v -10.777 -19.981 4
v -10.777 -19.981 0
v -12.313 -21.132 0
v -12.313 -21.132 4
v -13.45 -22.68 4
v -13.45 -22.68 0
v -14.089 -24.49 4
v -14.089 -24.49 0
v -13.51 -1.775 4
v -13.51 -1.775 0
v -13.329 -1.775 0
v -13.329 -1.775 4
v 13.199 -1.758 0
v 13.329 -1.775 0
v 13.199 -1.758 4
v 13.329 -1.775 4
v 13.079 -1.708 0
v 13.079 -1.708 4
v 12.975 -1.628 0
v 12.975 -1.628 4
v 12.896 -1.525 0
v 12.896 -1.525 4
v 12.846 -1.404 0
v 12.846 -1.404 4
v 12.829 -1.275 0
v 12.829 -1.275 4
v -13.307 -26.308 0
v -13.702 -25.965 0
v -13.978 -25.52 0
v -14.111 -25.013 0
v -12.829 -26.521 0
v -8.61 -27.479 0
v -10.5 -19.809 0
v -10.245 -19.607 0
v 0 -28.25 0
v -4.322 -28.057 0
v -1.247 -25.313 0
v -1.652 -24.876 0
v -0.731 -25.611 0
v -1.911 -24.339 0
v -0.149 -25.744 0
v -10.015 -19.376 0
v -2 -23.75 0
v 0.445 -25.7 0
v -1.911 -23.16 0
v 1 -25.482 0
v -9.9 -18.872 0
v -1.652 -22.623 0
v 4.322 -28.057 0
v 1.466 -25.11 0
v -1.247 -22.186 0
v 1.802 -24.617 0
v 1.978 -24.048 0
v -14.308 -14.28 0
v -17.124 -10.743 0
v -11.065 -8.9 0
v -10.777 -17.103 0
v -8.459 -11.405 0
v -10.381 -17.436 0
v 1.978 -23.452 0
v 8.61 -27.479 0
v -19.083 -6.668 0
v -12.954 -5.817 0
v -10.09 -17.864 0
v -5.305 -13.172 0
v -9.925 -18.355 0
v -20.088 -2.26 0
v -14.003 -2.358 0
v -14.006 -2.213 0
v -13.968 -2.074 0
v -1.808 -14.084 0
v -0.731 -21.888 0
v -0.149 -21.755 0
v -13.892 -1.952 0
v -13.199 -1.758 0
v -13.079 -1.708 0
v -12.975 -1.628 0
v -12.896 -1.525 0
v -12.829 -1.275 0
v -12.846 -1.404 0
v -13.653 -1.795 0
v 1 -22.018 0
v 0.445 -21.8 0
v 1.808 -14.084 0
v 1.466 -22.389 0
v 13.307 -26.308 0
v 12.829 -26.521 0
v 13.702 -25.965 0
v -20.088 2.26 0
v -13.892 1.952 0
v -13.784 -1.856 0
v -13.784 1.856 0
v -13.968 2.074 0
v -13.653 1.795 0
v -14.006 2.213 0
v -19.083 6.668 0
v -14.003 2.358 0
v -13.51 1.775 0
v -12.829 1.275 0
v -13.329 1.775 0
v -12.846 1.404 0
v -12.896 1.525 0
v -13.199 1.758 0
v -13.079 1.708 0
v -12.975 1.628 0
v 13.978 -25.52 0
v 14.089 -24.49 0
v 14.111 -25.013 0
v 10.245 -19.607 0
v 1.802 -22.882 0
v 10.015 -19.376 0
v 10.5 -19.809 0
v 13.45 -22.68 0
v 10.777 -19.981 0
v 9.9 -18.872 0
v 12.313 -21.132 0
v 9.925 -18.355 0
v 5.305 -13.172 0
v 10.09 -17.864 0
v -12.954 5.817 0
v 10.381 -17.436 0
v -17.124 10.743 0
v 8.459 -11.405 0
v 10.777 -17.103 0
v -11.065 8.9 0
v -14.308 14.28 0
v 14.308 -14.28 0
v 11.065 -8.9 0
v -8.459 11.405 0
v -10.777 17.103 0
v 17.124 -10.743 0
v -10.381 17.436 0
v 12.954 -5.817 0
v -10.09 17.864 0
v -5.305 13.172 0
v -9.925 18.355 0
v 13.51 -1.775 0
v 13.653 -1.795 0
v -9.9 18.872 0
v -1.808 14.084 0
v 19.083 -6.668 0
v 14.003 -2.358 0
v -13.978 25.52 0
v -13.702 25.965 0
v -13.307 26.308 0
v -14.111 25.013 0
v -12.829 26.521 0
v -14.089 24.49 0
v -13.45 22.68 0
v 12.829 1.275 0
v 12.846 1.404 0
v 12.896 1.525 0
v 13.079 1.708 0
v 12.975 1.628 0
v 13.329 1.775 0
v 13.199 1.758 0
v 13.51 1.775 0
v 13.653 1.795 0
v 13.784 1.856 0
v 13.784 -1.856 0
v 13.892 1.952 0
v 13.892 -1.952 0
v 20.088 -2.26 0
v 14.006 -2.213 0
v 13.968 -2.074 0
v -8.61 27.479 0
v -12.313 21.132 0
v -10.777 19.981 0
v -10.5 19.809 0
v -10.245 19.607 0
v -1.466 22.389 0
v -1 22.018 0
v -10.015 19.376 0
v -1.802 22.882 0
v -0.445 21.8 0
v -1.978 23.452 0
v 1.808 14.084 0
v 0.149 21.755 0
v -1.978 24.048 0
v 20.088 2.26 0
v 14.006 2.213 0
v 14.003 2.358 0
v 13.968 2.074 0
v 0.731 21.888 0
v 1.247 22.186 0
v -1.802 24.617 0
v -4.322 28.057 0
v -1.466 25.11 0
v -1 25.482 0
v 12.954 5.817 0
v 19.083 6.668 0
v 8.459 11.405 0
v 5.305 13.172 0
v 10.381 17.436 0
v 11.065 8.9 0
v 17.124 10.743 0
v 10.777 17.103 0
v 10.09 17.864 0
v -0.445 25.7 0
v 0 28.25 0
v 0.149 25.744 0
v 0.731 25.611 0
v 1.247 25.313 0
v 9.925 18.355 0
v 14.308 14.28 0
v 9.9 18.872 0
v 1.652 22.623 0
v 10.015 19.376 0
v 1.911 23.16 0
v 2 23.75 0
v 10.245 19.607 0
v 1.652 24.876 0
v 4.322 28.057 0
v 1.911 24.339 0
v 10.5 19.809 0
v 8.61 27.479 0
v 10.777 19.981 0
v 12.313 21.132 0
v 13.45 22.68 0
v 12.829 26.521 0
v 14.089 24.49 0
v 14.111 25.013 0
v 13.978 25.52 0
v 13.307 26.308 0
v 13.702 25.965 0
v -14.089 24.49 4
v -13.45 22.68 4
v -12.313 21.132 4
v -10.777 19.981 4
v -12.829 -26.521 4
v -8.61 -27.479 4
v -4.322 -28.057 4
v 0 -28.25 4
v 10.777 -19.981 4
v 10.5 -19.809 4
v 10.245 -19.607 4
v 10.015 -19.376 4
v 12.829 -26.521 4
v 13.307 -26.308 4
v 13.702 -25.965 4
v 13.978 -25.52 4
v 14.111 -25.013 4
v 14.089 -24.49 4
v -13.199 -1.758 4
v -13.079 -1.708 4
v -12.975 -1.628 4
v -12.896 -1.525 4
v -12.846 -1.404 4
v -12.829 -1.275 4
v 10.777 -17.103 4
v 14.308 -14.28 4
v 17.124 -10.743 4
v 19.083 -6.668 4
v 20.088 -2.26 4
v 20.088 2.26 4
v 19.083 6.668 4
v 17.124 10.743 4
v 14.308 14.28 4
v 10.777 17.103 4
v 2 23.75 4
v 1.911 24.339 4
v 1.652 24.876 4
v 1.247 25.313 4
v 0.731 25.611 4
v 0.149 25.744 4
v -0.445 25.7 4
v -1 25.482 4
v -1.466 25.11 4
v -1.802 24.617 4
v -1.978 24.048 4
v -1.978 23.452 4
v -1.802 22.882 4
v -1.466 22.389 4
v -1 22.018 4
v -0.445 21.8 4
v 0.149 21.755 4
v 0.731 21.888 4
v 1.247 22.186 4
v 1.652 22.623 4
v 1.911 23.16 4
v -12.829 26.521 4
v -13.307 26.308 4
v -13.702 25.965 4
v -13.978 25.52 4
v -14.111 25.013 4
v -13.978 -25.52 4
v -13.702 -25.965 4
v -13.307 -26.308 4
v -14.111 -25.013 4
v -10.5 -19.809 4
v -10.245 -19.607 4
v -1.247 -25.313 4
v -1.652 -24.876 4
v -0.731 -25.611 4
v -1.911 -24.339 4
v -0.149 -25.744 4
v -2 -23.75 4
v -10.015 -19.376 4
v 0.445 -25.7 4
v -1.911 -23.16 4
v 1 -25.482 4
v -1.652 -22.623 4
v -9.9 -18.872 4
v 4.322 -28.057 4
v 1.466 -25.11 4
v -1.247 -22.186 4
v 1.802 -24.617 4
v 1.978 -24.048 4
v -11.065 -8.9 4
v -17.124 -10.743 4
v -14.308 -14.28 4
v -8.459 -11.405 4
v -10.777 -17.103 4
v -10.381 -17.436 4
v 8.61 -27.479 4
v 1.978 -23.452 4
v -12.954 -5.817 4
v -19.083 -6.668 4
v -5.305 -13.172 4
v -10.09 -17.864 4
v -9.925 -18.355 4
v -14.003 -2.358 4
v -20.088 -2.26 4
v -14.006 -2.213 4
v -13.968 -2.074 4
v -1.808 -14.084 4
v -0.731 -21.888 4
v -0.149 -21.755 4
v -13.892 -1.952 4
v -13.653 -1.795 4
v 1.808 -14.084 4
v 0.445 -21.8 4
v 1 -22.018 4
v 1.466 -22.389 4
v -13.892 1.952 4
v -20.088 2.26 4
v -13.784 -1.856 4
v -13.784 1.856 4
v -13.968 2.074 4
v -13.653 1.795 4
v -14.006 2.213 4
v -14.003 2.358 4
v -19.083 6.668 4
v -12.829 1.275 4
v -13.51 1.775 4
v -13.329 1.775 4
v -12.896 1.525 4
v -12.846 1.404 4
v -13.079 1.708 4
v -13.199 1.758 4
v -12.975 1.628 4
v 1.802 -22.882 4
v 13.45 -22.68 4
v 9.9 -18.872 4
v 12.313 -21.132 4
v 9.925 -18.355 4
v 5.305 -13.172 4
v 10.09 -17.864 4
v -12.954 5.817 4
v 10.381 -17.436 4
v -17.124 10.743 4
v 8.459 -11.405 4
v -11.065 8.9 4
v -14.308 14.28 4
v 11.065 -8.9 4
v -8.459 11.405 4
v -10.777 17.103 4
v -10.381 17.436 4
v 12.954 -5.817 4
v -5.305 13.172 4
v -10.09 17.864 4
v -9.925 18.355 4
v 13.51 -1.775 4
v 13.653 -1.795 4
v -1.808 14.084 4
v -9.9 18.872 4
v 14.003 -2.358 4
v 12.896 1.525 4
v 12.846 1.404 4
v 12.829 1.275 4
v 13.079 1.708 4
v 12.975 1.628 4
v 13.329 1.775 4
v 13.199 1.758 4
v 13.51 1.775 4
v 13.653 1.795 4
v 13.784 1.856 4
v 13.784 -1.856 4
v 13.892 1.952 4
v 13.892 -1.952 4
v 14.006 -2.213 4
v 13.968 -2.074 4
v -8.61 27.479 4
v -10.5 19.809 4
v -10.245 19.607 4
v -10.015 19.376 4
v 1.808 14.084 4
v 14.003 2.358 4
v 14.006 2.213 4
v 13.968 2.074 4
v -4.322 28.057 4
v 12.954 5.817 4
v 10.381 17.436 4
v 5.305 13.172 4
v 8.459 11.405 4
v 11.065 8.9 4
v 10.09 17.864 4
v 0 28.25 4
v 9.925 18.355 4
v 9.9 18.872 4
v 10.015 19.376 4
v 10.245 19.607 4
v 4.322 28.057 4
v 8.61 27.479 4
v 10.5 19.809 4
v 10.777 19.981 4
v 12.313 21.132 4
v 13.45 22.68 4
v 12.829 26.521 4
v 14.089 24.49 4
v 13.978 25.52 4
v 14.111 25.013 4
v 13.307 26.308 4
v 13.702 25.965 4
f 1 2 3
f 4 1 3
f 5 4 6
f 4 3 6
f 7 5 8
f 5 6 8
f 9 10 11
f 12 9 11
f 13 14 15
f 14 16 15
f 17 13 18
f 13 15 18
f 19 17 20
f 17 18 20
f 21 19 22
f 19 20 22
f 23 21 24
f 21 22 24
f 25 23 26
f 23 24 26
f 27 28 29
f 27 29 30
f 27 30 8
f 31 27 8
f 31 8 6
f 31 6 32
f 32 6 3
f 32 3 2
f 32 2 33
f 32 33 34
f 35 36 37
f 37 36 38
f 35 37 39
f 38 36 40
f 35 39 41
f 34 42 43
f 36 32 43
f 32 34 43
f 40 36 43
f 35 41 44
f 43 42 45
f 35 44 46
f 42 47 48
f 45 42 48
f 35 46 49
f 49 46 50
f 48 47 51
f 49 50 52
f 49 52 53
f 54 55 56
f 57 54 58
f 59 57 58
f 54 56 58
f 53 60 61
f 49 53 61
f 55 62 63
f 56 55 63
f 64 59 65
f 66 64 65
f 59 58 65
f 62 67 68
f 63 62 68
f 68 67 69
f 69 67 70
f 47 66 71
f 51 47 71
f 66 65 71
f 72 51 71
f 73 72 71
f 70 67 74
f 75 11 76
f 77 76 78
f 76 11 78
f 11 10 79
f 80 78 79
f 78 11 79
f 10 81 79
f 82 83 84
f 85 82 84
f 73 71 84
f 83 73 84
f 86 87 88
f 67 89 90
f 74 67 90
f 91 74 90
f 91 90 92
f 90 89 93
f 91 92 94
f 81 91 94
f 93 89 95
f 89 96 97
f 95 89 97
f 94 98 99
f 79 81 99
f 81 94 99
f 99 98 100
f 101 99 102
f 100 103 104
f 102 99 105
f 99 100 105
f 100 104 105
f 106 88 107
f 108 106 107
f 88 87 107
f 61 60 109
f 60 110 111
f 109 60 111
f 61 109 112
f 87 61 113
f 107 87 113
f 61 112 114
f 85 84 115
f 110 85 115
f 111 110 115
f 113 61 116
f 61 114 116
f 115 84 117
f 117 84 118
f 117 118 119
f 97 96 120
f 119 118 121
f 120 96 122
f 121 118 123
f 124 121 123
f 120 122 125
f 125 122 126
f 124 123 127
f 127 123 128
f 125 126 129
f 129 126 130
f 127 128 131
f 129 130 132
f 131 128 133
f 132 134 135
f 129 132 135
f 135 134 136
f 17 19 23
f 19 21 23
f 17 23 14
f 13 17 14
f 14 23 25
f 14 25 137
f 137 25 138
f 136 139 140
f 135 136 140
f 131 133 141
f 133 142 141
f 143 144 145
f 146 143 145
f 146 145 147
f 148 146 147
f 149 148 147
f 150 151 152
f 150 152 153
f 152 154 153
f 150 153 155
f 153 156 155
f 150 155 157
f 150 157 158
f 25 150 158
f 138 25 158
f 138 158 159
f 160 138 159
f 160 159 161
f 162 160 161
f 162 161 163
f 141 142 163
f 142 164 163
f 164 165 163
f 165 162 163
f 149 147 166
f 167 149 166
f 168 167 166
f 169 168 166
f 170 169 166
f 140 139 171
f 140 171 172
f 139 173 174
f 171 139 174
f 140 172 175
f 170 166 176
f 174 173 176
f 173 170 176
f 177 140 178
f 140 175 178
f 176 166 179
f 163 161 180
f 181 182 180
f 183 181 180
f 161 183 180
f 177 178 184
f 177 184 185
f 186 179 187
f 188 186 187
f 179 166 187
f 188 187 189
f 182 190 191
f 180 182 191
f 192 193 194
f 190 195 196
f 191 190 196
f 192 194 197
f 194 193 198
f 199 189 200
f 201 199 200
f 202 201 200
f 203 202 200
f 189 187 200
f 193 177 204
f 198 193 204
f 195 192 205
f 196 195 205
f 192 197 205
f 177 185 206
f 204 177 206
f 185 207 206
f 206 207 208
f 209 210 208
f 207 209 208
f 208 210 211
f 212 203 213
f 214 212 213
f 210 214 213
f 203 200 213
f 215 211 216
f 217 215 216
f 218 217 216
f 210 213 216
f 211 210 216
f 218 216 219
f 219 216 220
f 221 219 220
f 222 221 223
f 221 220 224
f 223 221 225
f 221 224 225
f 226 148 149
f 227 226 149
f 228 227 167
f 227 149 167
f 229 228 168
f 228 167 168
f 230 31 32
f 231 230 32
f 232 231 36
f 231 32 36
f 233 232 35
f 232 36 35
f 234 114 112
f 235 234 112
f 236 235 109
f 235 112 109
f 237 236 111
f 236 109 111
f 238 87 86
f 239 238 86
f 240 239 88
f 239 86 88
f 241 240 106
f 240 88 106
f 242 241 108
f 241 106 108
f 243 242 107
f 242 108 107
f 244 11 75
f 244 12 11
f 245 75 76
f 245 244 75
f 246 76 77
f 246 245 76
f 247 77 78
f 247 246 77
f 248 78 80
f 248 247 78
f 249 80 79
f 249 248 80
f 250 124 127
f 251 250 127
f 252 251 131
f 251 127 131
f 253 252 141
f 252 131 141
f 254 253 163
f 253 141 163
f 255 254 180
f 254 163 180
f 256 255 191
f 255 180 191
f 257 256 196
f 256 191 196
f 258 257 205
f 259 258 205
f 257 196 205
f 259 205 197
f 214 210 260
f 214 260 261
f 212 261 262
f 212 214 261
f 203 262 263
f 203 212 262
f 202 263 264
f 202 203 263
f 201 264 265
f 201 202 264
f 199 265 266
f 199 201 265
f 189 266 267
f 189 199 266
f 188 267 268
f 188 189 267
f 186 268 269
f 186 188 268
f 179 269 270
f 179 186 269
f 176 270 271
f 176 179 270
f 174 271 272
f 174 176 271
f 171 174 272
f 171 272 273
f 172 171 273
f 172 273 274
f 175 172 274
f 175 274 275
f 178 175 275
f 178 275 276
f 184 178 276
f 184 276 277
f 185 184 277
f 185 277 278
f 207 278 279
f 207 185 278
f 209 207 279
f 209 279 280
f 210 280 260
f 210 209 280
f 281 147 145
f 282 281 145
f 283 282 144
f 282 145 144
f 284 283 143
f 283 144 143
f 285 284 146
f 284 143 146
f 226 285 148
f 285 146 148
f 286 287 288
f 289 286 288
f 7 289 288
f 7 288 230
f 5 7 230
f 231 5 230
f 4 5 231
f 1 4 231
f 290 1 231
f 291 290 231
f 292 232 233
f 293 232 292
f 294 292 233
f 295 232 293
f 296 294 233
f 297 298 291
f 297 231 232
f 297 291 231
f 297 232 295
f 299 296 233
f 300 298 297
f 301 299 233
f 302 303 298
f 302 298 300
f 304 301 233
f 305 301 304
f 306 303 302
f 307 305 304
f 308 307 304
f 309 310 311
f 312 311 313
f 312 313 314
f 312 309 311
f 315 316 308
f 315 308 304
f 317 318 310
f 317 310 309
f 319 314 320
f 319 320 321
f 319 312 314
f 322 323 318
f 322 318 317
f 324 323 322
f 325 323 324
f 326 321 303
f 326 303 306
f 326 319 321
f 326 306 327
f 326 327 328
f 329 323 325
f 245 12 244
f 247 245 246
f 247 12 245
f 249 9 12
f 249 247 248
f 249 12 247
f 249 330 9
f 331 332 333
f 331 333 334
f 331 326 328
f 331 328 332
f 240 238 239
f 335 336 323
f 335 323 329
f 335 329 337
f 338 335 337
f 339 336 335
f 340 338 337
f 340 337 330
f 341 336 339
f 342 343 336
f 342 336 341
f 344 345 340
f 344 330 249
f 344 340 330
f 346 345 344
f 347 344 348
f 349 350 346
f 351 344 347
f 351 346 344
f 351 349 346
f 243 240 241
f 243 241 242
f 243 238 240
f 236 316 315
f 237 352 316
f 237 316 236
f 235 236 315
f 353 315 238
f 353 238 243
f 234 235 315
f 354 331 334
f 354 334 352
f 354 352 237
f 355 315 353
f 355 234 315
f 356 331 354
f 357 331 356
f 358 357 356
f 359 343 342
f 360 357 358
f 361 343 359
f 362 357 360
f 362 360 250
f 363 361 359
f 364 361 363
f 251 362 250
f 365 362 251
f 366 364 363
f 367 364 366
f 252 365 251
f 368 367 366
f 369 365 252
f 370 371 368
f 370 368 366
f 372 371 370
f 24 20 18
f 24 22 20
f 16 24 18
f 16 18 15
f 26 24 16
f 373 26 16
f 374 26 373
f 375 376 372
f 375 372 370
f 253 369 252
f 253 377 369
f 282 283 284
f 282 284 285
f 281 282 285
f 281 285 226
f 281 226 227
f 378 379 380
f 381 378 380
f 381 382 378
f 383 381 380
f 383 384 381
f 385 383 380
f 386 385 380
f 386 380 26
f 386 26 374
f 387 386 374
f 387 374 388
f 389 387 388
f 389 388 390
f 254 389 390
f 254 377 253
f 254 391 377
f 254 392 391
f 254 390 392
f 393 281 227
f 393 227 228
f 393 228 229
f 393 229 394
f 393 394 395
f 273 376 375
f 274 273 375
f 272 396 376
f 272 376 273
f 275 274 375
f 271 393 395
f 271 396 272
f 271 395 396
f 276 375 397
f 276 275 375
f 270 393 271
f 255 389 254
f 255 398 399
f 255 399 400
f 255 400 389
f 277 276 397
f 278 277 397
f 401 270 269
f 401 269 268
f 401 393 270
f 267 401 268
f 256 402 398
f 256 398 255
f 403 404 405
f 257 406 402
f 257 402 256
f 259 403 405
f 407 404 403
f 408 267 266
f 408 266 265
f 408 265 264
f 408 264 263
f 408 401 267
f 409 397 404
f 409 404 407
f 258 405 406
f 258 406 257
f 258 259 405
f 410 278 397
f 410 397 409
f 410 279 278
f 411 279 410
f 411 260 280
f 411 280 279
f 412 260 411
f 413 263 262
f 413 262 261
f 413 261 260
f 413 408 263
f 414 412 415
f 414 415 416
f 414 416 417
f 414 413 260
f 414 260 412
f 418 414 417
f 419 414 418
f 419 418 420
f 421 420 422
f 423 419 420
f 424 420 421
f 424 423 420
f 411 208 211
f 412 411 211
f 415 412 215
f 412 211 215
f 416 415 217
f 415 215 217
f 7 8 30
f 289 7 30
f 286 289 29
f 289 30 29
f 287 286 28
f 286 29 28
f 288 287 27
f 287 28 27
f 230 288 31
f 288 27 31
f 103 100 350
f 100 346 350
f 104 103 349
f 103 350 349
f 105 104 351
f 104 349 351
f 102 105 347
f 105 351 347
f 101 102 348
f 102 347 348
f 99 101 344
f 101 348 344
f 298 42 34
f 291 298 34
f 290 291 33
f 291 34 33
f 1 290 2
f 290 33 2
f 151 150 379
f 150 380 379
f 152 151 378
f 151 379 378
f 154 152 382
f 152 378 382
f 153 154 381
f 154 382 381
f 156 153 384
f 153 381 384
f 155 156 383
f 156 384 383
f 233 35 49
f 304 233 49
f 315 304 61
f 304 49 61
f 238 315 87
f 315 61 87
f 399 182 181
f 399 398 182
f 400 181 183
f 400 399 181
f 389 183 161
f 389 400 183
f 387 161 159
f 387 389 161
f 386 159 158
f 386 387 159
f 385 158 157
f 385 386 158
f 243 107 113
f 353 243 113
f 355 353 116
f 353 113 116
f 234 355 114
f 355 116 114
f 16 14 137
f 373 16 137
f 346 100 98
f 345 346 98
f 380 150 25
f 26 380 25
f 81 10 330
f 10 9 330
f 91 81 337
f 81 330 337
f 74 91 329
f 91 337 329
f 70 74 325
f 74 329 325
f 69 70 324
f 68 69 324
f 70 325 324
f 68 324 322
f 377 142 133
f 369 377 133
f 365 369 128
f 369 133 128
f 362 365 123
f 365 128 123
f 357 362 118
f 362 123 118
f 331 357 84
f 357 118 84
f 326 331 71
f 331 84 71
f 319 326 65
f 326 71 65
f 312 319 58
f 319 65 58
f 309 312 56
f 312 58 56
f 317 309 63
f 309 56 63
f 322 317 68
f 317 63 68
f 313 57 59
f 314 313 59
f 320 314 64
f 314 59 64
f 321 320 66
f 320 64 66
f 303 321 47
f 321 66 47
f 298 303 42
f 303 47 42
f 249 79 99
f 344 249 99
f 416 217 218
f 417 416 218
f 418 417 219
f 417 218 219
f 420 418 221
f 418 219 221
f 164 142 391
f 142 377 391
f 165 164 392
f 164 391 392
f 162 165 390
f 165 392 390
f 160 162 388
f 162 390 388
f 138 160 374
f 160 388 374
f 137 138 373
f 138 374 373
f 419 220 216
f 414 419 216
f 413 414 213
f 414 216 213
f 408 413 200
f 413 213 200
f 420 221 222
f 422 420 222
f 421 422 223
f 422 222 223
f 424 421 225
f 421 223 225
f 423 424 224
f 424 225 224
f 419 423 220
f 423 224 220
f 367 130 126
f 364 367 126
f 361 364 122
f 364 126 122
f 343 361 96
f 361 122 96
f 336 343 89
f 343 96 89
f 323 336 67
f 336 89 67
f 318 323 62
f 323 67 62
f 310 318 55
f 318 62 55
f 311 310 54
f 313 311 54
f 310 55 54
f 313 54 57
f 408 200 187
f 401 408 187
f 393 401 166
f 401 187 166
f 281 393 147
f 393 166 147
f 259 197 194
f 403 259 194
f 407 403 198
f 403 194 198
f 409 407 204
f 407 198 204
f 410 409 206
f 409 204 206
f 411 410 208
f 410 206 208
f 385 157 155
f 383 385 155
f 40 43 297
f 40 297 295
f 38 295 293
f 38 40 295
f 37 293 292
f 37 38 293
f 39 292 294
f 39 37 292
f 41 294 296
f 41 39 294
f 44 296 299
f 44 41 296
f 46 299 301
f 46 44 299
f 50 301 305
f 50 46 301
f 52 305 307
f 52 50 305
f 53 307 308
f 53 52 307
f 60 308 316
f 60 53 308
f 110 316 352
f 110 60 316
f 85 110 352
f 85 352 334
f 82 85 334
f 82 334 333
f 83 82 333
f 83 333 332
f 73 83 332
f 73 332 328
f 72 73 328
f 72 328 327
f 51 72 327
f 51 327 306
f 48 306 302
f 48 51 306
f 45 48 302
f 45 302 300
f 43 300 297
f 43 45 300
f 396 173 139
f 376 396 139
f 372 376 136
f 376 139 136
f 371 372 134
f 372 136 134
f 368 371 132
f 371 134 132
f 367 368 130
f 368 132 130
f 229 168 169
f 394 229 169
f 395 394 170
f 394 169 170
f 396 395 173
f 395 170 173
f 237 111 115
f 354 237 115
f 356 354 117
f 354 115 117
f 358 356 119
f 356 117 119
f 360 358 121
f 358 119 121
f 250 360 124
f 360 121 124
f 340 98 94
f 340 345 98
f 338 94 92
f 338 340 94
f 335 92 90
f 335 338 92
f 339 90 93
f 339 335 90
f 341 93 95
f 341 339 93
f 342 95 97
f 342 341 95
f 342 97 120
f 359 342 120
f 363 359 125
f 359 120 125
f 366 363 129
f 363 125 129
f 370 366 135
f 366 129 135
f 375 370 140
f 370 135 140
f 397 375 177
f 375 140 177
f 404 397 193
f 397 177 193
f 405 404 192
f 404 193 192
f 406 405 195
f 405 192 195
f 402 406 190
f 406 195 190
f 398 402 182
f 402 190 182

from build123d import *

# Parameters (mm, degrees)
BOSS_EXTRUDE2_DEPTH     = 4
FILLET1_R               = 0.5
FILLET2_R               = 0.5
CUT_EXTRUDE1_DEPTH      = 35.96700514
CUT_EXTRUDE1_DEPTH_BACK = 35.96700514
SKETCH4_R               = 2


with BuildPart() as part:
    # Sketch3 → Boss-Extrude2 (new body)
    with BuildSketch(Plane.XY):
        with BuildLine():
            ThreePointArc((-10.014736402, 19.376191891), (-9.990551511, 18.103554733), (-10.776995598, 17.102707121))
            ThreePointArc((-10.776995598, 17.102707121), (-20.215, 0), (-10.776995598, -17.102707121))
            ThreePointArc((-10.776995598, -17.102707121), (-9.990551511, -18.103554733), (-10.014736402, -19.376191891))
            ThreePointArc((-10.014736402, -19.376191891), (-10.36939918, -19.711941674), (-10.776995598, -19.98097469))
            ThreePointArc((-10.776995598, -19.98097469), (-12.938385888, -21.864089687), (-14.088666538, -24.48984377))
            ThreePointArc((-14.088666538, -24.48984377), (-13.85696402, -25.752415366), (-12.828666538, -26.520775556))
            ThreePointArc((-12.828666538, -26.520775556), (-6.472322707, -27.815519537), (0, -28.249694219))
            ThreePointArc((0, -28.249694219), (6.472322707, -27.815519537), (12.828666538, -26.520775556))
            ThreePointArc((12.828666538, -26.520775556), (13.85696402, -25.752415366), (14.088666538, -24.48984377))
            ThreePointArc((14.088666538, -24.48984377), (12.938385888, -21.864089687), (10.776995598, -19.98097469))
            ThreePointArc((10.776995598, -19.98097469), (10.36939918, -19.711941674), (10.014736402, -19.376191891))
            ThreePointArc((10.014736402, -19.376191891), (9.990551511, -18.103554733), (10.776995598, -17.102707121))
            ThreePointArc((10.776995598, -17.102707121), (20.215, 0), (10.776995598, 17.102707121))
            ThreePointArc((10.776995598, 17.102707121), (9.990551511, 18.103554733), (10.014736402, 19.376191891))
            ThreePointArc((10.014736402, 19.376191891), (10.36939918, 19.711941674), (10.776995598, 19.98097469))
            ThreePointArc((10.776995598, 19.98097469), (12.938385888, 21.864089687), (14.088666538, 24.48984377))
            ThreePointArc((14.088666538, 24.48984377), (13.85696402, 25.752415366), (12.828666538, 26.520775556))
            ThreePointArc((12.828666538, 26.520775556), (6.472322707, 27.815519537), (0, 28.249694219))
            ThreePointArc((0, 28.249694219), (-6.472322707, 27.815519537), (-12.828666538, 26.520775556))
            ThreePointArc((-12.828666538, 26.520775556), (-13.85696402, 25.752415366), (-14.088666538, 24.48984377))
            ThreePointArc((-14.088666538, 24.48984377), (-12.938385888, 21.864089687), (-10.776995598, 19.98097469))
            ThreePointArc((-10.776995598, 19.98097469), (-10.36939918, 19.711941674), (-10.014736402, 19.376191891))
        make_face()
        with BuildLine():
            Line((-12.828666538, -1.774676079), (-12.828666538, 1.774676079))
            Line((-12.828666538, 1.774676079), (-14.088666538, 1.774676079))
            ThreePointArc((-14.088666538, 1.774676079), (0, 14.2), (14.088666538, 1.774676079))
            Line((14.088666538, 1.774676079), (12.828666538, 1.774676079))
            Line((12.828666538, 1.774676079), (12.828666538, -1.774676079))
            Line((12.828666538, -1.774676079), (14.088666538, -1.774676079))
            ThreePointArc((14.088666538, -1.774676079), (0, -14.2), (-14.088666538, -1.774676079))
            Line((-14.088666538, -1.774676079), (-12.828666538, -1.774676079))
        make_face(mode=Mode.SUBTRACT)
    extrude(amount=BOSS_EXTRUDE2_DEPTH)

    # Fillet1
    fillet1_edges = [part.edges().sort_by_distance(p)[0] for p in [
        (-12.828666538, 1.774676079, 2),
        (-12.828666538, -1.774676079, 2),
        (12.828666538, -1.774676079, 2),
        (12.828666538, 1.774676079, 2),
    ]]
    fillet(fillet1_edges, radius=FILLET1_R)

    # Fillet2
    fillet2_edges = [part.edges().sort_by_distance(p)[0] for p in [
        (-14.088666538, 1.774676079, 2),
        (-14.088666538, -1.774676079, 2),
        (14.088666538, -1.774676079, 2),
        (14.088666538, 1.774676079, 2),
    ]]
    fillet(fillet2_edges, radius=FILLET2_R)

    # Sketch4 → Cut-Extrude1 (cut, two sides: drawn at the far end of the back side and taken through both)
    with BuildSketch(Plane.XY.offset(4).offset(-CUT_EXTRUDE1_DEPTH_BACK)):
        with Locations((0, 23.749694219)):
            Circle(SKETCH4_R)
        with Locations(Location((0, -23.749694219, 0), (0, 0, 180))):
            Circle(SKETCH4_R)
    extrude(amount=CUT_EXTRUDE1_DEPTH + CUT_EXTRUDE1_DEPTH_BACK, mode=Mode.SUBTRACT)


solid = part.part
